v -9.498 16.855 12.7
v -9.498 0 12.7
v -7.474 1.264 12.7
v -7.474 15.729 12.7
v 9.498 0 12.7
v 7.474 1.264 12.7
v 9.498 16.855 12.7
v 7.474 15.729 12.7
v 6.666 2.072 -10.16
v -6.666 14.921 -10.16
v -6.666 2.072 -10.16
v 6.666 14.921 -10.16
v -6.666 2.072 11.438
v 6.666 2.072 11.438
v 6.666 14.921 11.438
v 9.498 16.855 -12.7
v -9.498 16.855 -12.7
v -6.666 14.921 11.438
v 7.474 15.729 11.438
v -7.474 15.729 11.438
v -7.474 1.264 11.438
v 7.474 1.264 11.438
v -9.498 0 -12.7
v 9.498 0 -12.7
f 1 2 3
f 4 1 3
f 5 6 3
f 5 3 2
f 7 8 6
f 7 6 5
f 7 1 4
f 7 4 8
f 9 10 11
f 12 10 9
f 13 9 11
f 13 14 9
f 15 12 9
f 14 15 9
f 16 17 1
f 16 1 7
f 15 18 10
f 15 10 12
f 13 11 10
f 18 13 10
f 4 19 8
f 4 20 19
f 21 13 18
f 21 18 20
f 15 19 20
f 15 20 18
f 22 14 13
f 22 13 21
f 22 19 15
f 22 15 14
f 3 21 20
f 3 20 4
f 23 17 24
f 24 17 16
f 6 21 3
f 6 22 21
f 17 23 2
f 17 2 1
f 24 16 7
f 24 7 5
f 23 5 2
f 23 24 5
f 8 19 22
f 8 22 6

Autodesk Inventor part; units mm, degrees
ref_plane "XZ Plane" through (0, 0, 0) normal (0, 1, 0) x (-1, 0, 0)
ref_plane "XY Plane" through (0, 0, 0) normal (0, 0, 1) x (1, 0, 0)
sketch "Sketch1" plane through (0, 0, 0) normal (0, 0, 1) x (1, 0, 0)
  line L0 (-9.4982, 16.8551) -> (9.4982, 16.8551)
  line L1 (9.4982, 16.8551) -> (9.4982, 0)
  line L2 (9.4982, 0) -> (-9.4982, 0)
  line L3 (-9.4982, 0) -> (-9.4982, 16.8551)
  point P0 (0, 0)
  point P1 (0, 0)
  dimension "d0" = 16.8551
  dimension "d1" = 18.9965
extrude "Extrusion1" add sketch "Sketch1" along normal mid plane 25.4
sketch "Sketch2" plane through (0, 0, 12.7) normal (0, 0, 1) x (1, 0, 0)
  line L0 (-6.666, 14.9209) -> (6.666, 14.9209)
  line L1 (6.666, 14.9209) -> (6.666, 2.0723)
  line L2 (6.666, 2.0723) -> (-6.666, 2.0723)
  line L3 (-6.666, 2.0723) -> (-6.666, 14.9209)
  line L4 (-9.4982, 0) -> (9.4982, 0) projected
  point P0 (0, 0)
  point P1 (0, 0)
  point P2 (0, 2.0723)
  dimension "d4" = 12.8485
  dimension "d5" = 13.3321
extrude "Extrusion2" cut sketch "Sketch2" against normal blind 22.86
ref_plane "Work Plane1" through (0, 0, 0) normal (1, 0, 0) x (0, 1, 0)
sketch "Sketch3" plane through (0, 0, 0) normal (1, 0, 0) x (0, 1, 0)
  line L0 (14.9209, 12.7) -> (14.9209, -10.16) projected
  line L1 (16.8551, 12.7) -> (0, 12.7) projected
  line L2 (15.7291, 12.7) -> (15.7291, 11.4381)
  line L3 (15.7291, 11.4381) -> (14.9209, 11.4381)
  line L4 (14.9209, 11.4381) -> (14.9209, 12.7)
  line L5 (15.7291, 12.7) -> (14.9209, 12.7)
  point P0 (0, 0)
  dimension "d9" = 1.2619
  dimension "d10" = 0.8082
sketch3d "3D Sketch1"
  line L0 (-6.666, 14.9209, 12.7) -> (-6.666, 2.0723, 12.7)
  line L1 (-6.666, 2.0723, 12.7) -> (6.666, 2.0723, 12.7)
  line L2 (6.666, 2.0723, 12.7) -> (6.666, 14.9209, 12.7)
  line L3 (6.666, 14.9209, 12.7) -> (-6.666, 14.9209, 12.7)
sweep "Sweep1" cut profiles "Sketch3" path "3D Sketch1"
